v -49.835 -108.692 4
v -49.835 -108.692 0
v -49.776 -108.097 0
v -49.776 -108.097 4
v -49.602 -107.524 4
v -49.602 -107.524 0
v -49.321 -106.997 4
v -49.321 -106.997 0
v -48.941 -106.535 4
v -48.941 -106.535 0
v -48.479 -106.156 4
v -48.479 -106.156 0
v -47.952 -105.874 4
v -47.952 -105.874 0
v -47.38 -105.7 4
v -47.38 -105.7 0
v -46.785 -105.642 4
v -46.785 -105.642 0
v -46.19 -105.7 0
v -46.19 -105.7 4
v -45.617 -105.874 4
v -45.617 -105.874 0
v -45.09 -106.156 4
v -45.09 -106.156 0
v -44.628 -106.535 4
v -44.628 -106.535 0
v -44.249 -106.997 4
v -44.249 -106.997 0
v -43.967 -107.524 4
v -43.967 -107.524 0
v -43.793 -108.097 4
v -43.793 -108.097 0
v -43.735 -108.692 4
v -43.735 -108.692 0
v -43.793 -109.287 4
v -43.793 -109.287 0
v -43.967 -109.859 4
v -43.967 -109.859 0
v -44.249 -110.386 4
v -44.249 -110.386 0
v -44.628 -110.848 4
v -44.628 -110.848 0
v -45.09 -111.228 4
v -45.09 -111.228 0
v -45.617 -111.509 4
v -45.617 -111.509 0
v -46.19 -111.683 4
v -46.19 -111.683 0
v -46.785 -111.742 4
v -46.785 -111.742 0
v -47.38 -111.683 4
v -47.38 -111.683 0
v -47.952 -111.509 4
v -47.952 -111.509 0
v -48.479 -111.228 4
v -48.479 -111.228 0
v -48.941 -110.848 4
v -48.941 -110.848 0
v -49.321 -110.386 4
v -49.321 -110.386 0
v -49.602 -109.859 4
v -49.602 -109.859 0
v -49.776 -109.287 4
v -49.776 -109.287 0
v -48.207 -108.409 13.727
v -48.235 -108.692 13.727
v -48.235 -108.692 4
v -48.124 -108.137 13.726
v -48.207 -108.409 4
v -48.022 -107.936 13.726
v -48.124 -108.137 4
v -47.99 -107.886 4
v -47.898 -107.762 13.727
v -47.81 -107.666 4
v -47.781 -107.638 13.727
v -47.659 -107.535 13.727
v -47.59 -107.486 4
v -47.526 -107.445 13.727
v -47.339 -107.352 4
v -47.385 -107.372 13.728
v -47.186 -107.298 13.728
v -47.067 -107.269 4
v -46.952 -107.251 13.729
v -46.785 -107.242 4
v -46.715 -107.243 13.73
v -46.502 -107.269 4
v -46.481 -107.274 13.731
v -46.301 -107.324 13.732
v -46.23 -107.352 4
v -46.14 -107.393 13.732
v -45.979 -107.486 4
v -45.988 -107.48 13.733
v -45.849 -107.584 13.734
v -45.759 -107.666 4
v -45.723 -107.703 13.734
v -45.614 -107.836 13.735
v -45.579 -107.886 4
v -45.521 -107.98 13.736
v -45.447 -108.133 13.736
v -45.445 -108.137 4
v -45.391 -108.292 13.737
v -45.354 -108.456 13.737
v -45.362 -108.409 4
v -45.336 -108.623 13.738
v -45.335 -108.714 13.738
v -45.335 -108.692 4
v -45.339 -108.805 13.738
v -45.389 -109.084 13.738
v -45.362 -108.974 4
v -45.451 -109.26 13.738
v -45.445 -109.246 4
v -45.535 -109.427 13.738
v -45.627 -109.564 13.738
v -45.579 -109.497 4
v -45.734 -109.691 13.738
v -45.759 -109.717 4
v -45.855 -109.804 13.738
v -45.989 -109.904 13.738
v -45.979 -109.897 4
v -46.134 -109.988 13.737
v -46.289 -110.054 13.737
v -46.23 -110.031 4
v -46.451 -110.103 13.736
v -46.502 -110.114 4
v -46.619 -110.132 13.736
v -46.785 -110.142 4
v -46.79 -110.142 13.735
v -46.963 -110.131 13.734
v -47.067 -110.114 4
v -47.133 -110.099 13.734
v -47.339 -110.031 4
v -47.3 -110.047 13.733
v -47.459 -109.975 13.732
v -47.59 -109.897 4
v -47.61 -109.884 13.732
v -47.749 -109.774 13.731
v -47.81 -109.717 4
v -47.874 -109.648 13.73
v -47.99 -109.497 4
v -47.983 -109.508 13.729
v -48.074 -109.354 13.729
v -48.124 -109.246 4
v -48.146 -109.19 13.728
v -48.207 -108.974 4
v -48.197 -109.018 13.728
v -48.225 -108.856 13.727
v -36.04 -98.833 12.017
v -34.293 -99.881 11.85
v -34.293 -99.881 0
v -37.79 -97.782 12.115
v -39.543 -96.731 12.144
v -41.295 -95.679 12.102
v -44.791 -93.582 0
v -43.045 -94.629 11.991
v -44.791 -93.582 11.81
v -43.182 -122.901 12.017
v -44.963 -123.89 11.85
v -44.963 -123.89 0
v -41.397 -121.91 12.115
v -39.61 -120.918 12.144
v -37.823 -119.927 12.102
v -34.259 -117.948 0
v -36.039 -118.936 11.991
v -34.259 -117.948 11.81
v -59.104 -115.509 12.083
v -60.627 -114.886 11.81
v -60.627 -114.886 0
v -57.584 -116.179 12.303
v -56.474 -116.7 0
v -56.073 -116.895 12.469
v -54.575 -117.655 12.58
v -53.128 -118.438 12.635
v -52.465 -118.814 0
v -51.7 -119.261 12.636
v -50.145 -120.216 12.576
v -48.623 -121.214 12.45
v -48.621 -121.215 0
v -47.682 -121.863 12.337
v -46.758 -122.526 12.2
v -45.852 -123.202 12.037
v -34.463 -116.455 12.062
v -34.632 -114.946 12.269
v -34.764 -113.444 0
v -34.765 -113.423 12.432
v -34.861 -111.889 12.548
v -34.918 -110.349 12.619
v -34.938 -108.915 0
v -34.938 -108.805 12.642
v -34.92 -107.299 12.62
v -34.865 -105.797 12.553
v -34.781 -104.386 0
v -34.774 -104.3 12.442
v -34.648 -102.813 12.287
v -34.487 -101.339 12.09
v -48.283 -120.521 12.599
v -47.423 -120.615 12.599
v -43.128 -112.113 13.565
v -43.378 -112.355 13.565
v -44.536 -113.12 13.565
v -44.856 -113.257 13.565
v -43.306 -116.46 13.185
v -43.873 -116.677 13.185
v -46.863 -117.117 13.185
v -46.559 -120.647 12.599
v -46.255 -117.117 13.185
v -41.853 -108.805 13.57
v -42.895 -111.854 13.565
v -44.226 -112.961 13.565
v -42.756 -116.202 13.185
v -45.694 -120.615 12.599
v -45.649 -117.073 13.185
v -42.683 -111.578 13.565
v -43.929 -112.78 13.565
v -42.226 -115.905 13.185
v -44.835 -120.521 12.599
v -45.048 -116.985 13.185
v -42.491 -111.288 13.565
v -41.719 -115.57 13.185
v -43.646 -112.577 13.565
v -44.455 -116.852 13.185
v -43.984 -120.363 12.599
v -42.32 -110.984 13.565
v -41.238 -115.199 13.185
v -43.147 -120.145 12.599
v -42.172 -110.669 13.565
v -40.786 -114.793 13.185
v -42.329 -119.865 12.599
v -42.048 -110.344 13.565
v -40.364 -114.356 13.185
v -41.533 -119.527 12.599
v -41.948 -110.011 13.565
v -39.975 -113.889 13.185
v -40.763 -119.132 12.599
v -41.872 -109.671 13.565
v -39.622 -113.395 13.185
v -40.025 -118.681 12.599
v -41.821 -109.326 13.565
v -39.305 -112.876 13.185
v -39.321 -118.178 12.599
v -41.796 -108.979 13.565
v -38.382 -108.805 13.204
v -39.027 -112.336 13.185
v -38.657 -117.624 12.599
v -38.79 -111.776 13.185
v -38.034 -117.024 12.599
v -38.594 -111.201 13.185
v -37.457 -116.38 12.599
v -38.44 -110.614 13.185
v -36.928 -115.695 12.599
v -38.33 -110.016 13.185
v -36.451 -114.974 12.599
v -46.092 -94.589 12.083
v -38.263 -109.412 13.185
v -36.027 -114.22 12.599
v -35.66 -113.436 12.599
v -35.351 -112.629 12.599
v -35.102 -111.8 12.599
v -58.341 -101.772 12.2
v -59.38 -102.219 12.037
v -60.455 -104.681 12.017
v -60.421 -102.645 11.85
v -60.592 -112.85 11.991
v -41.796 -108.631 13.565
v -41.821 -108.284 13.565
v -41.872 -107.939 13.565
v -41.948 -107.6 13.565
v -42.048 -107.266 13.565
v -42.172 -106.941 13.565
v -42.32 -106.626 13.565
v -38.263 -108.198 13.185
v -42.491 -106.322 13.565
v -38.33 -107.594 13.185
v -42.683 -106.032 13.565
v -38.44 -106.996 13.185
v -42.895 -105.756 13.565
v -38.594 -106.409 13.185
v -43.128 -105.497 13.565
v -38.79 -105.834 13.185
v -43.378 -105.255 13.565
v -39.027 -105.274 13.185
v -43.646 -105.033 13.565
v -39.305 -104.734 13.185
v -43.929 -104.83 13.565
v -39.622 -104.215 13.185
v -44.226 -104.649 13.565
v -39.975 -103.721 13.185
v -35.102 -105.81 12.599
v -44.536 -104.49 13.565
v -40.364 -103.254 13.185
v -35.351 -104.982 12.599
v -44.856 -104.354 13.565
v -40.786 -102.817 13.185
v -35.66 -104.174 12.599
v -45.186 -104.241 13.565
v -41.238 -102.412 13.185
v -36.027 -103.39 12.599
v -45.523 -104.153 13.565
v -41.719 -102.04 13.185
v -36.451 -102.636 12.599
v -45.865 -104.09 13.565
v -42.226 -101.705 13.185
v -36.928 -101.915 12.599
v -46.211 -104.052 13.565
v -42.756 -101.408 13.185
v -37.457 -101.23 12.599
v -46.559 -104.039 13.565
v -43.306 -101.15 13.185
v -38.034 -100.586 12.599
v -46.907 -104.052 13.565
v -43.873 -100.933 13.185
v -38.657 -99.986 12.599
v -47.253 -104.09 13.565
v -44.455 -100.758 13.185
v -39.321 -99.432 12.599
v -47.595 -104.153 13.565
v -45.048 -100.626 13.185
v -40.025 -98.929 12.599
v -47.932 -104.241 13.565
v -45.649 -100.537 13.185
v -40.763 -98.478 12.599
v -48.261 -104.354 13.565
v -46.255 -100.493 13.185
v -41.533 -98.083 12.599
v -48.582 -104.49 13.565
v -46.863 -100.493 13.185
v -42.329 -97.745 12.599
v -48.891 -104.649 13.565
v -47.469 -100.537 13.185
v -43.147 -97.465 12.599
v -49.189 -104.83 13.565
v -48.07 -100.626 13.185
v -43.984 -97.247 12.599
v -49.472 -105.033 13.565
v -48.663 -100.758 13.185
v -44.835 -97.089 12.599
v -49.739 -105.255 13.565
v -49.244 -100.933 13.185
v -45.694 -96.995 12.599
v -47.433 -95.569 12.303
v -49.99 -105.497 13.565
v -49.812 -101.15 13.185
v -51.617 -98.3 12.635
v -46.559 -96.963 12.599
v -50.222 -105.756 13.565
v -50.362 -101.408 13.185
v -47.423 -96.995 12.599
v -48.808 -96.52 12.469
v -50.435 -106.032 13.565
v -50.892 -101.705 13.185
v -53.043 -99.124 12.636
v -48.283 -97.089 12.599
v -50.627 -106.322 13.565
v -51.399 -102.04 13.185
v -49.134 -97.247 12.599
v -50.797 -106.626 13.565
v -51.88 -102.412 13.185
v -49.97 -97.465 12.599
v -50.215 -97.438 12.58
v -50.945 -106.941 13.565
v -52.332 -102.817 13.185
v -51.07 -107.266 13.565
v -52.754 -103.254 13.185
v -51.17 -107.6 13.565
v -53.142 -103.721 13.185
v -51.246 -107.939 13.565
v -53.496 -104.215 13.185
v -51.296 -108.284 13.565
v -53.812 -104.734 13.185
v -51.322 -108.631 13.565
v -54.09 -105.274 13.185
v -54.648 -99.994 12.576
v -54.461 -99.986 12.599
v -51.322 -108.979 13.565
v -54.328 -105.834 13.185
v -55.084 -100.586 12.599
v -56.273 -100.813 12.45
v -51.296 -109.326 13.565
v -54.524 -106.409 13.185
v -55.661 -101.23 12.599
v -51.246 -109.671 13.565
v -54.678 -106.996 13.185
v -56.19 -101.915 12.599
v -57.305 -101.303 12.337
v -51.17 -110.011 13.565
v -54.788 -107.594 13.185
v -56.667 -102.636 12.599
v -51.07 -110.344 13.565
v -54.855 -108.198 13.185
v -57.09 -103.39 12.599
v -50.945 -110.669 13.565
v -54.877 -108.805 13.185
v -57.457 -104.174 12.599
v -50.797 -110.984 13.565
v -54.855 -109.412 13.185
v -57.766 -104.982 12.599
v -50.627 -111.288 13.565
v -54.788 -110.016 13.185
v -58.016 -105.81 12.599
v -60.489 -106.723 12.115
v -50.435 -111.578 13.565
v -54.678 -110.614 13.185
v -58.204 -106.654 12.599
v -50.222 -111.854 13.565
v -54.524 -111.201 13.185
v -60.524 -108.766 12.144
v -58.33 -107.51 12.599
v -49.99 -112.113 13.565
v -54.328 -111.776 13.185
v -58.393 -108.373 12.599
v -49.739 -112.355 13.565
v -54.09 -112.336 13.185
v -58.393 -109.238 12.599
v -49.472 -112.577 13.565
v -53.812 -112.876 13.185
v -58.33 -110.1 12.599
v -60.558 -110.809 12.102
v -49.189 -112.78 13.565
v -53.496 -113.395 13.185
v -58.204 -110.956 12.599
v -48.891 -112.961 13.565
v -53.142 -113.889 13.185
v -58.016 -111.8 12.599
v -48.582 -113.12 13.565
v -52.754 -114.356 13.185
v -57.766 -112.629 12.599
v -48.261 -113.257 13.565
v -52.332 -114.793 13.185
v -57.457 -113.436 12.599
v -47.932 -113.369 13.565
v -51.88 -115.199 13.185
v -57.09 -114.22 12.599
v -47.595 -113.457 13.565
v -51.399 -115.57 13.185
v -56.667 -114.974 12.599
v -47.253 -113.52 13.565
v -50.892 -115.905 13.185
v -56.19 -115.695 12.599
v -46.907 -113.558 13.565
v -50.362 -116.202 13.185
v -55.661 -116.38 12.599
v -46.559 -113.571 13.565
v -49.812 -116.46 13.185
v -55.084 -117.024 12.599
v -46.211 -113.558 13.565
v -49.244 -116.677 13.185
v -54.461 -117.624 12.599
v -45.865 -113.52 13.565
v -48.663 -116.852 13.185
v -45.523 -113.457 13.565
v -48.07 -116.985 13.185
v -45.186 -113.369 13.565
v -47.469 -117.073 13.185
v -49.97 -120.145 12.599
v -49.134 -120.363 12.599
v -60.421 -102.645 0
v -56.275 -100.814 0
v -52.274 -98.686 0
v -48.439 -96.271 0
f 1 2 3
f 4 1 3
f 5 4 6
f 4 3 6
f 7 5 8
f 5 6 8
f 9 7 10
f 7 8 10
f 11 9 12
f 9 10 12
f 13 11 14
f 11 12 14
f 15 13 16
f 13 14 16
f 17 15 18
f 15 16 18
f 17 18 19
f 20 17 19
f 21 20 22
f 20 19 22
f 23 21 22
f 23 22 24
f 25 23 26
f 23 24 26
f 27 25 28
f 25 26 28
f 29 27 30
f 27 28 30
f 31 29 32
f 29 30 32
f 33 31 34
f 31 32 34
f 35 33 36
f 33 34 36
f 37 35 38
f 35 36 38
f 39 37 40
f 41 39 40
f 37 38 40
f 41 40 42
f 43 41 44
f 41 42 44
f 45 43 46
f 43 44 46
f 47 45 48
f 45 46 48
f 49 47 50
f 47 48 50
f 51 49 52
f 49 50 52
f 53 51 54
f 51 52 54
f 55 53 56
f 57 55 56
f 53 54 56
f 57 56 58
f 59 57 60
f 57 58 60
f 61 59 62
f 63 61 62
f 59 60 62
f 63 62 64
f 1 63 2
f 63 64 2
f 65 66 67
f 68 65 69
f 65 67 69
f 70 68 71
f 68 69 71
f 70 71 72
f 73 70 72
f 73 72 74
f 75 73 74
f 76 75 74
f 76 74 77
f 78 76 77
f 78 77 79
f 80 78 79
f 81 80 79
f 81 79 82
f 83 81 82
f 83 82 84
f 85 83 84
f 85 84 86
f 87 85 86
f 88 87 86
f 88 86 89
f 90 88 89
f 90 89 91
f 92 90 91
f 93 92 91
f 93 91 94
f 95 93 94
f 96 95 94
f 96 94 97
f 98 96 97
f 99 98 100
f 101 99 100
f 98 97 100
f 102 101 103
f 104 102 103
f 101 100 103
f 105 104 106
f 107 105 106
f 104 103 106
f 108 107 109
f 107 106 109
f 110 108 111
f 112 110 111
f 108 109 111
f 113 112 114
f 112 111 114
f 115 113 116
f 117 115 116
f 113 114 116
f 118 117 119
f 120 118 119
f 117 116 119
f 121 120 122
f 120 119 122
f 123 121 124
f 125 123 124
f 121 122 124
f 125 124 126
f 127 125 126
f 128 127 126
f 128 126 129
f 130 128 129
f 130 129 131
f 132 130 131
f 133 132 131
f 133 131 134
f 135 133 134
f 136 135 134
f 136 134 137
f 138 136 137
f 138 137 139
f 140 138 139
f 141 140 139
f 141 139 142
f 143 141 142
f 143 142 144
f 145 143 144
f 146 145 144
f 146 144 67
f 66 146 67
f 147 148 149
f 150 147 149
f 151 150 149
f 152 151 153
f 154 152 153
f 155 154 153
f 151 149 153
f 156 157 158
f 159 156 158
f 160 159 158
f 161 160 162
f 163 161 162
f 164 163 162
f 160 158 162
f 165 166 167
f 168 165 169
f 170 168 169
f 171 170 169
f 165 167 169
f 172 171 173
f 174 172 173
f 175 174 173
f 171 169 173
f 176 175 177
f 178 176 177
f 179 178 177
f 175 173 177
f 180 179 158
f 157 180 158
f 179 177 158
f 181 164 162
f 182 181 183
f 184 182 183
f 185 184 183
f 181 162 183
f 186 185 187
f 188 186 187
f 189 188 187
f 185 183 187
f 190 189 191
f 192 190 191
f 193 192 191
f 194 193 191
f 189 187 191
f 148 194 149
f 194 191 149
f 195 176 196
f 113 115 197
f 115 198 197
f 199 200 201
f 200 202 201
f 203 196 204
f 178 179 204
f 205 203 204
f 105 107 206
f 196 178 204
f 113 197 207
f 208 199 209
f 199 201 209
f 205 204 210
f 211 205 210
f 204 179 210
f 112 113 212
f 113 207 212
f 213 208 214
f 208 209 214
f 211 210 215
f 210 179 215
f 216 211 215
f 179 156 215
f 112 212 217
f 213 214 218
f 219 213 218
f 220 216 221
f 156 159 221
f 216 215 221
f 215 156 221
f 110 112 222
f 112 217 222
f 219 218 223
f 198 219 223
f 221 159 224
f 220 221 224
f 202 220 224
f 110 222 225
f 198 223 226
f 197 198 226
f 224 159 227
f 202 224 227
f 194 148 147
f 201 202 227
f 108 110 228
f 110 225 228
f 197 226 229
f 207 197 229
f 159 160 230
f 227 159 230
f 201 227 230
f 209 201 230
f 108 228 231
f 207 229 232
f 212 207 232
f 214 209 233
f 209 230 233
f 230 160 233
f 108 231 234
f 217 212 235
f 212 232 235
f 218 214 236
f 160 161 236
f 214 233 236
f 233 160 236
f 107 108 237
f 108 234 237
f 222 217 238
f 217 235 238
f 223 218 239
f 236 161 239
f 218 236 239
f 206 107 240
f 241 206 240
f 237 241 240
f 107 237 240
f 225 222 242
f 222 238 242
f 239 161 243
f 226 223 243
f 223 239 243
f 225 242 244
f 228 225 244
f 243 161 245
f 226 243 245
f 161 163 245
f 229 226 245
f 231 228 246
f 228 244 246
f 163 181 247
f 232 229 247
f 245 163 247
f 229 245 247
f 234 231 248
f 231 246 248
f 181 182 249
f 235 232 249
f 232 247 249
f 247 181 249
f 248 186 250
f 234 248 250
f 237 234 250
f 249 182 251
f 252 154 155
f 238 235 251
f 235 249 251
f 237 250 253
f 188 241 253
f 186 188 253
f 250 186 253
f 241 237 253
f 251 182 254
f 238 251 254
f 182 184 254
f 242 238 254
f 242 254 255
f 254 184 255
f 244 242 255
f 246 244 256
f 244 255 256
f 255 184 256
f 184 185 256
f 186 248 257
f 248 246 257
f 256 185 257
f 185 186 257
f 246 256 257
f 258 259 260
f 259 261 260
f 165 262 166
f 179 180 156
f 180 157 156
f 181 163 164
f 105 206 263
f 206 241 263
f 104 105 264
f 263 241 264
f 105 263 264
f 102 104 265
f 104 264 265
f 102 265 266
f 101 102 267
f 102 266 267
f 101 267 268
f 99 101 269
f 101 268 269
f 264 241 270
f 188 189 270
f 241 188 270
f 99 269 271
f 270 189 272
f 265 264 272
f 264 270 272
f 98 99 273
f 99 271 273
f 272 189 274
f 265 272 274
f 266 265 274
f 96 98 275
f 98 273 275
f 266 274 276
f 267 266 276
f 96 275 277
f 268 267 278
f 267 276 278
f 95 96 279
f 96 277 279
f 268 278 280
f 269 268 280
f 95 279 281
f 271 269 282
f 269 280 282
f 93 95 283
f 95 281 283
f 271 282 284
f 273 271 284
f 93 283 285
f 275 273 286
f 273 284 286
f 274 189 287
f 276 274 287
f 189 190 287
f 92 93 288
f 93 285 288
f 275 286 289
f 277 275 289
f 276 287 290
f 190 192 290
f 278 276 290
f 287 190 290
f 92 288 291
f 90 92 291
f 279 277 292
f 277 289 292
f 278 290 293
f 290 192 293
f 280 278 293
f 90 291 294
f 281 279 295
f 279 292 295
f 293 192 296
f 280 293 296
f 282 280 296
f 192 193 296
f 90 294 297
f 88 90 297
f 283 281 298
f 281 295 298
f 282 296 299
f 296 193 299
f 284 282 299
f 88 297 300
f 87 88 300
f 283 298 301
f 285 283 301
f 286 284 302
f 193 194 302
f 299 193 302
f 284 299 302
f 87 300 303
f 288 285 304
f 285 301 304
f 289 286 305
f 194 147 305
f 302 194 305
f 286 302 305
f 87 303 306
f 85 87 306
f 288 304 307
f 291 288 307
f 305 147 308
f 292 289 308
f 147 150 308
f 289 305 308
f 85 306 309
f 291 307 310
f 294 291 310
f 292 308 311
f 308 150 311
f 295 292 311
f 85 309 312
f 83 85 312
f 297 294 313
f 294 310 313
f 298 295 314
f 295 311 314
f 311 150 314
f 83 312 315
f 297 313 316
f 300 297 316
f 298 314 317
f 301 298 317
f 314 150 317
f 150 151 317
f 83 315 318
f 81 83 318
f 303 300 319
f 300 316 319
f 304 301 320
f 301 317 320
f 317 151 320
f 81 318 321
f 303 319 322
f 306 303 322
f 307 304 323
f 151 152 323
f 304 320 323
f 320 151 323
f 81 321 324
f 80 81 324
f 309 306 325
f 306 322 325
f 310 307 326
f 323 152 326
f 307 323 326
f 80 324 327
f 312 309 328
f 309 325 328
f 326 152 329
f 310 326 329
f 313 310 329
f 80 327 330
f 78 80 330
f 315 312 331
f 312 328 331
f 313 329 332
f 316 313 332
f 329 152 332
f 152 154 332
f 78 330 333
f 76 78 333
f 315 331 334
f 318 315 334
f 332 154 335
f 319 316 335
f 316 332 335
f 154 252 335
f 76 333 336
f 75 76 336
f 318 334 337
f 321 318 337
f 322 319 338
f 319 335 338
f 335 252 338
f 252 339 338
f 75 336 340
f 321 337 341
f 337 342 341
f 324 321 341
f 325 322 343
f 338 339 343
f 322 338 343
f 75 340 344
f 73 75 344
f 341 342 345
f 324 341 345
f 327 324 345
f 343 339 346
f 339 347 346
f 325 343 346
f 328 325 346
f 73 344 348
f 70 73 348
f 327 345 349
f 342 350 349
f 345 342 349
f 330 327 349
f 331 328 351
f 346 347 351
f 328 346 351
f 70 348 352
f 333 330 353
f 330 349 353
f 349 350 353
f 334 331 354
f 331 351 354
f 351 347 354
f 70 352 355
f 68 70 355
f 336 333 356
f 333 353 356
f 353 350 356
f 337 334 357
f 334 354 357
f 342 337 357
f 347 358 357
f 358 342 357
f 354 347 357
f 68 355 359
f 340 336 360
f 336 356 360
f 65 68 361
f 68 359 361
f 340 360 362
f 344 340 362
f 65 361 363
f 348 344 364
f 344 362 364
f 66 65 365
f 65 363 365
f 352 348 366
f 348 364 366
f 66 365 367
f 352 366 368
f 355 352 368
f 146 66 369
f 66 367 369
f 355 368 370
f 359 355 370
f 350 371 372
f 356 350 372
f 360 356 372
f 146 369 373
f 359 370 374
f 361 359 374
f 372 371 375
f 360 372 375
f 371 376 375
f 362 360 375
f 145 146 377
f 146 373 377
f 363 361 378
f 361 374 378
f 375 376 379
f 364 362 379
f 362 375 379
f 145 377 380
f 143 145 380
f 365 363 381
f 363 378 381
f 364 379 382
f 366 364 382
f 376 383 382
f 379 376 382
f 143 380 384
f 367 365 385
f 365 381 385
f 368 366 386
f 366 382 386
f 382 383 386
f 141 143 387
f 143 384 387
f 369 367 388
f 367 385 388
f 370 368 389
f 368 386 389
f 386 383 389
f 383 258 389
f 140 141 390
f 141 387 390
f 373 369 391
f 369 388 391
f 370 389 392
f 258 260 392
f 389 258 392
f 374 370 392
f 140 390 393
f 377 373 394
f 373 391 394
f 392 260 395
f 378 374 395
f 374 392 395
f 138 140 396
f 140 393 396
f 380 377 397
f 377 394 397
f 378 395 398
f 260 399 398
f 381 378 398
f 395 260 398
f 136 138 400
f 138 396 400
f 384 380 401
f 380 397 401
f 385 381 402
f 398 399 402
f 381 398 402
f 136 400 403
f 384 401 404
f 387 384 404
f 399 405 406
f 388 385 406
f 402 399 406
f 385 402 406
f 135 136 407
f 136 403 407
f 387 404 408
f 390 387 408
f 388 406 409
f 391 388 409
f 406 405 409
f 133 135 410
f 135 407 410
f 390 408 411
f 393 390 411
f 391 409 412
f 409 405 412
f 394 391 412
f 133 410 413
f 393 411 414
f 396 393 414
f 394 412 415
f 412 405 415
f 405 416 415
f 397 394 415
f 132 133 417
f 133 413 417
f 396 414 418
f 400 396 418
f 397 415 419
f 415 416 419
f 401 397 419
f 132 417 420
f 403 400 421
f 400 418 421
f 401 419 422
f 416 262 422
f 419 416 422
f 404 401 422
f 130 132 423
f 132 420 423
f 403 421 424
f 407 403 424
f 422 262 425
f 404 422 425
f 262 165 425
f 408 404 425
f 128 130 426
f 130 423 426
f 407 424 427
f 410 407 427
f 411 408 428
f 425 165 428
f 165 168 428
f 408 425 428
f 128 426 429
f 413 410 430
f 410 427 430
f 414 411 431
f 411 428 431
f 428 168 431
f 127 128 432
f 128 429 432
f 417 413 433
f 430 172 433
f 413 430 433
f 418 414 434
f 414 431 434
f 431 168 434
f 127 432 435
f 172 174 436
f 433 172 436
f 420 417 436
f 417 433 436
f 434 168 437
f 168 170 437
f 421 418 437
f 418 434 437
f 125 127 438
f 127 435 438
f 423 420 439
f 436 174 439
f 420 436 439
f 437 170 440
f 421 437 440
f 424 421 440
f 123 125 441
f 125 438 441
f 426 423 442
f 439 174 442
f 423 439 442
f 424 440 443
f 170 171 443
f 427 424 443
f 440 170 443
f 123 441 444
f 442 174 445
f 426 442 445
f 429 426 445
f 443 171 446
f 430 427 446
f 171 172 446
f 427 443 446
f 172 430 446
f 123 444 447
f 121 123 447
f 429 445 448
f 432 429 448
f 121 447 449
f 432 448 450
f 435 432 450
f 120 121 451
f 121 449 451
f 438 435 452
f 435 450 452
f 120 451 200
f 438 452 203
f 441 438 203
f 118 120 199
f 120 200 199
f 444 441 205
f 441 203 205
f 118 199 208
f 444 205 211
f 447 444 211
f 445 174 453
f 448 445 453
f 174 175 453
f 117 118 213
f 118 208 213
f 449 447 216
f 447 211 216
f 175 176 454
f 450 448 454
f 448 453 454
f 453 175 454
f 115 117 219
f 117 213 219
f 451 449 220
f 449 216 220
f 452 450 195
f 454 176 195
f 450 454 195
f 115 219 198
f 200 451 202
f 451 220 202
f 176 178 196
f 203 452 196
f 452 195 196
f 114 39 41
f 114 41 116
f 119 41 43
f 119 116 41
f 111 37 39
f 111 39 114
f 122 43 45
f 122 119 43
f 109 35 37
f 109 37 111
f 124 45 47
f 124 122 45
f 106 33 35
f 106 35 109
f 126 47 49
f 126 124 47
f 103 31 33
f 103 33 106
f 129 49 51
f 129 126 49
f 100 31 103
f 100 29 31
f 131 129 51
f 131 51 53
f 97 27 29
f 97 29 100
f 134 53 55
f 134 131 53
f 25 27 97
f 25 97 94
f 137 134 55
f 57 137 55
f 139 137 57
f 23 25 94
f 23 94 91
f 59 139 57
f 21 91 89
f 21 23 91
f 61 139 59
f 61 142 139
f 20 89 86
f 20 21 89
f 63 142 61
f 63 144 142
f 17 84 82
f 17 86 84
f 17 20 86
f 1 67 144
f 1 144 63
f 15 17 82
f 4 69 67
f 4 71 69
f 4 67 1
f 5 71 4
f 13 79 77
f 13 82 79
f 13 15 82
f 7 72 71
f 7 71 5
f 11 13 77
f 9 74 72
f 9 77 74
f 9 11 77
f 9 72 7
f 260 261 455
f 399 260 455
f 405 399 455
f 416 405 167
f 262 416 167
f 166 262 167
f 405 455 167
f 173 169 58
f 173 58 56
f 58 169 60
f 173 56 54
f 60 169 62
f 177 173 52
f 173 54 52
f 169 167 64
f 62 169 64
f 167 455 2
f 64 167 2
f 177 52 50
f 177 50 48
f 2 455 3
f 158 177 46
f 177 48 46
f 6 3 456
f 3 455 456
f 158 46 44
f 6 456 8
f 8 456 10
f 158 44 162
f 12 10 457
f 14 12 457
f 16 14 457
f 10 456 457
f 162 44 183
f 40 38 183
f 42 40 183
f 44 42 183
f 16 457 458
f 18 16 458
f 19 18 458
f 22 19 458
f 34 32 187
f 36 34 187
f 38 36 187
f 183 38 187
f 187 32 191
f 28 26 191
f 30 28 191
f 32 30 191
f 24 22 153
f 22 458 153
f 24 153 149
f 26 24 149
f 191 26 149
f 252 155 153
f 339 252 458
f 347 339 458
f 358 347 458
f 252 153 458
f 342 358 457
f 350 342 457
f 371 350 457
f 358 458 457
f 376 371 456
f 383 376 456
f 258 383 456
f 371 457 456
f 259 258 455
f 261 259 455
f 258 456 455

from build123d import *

# Parameters (mm, degrees)
BOSS_EXTRUDE1_DEPTH = 13.75
SKETCH4_R           = 3.05
CUT_EXTRUDE1_DEPTH  = 4
SKETCH5_R           = 1.45
CUT_EXTRUDE2_DEPTH  = 139.272786048


with BuildPart() as part:
    # Boss-Extrude1: read off the stored shape, not the designer's step
    # Boss-Extrude1 outline → Boss-Extrude1 (new body)
    with BuildSketch(Plane.XY):
        with BuildLine():
            Line((-44.963090762, -123.889928328), (-34.25904674, -117.947860363))
            ThreePointArc((-34.25904674, -117.947860363), (-34.937745159, -108.915491102), (-34.292771341, -99.880651048))
            Line((-34.292771341, -99.880651048), (-44.790775161, -93.581710984))
            ThreePointArc((-44.790775161, -93.581710984), (-52.273687189, -98.685665687), (-60.420575103, -102.644522003))
            Line((-60.420575103, -102.644522003), (-60.626615305, -114.885530032))
            ThreePointArc((-60.626615305, -114.885530032), (-52.465004859, -118.81394459), (-44.963090762, -123.889928328))
        make_face()
    extrude(amount=BOSS_EXTRUDE1_DEPTH)

    # Boss-Extrude1 2 outline → Boss-Extrude1 2 (revolve, cut)
    with BuildSketch(Plane(origin=(-46.558812402, -108.805033793, 0), x_dir=(1, 0, 0), z_dir=(0, -1, 0))):
        with BuildLine():
            ThreePointArc((0, 13.75), (7.723984527, 13.263031911), (15.32564925, 11.809839448))
            Line((15.32564925, 11.809839448), (15.32564925, 13.75))
            Line((15.32564925, 13.75), (0, 13.75))
        make_face()
    revolve(axis=Axis((-46.558812402, -108.805033793, 0), (0, 0, 1)), mode=Mode.SUBTRACT)

    # Sketch4 → Cut-Extrude1 (cut)
    with BuildSketch(Plane(origin=(0, 0, 0), x_dir=(-1, 0, 0), z_dir=(0, 0, -1))):
        with Locations((46.784528167, -108.691568131)):
            Circle(SKETCH4_R)
    extrude(amount=-CUT_EXTRUDE1_DEPTH, mode=Mode.SUBTRACT)

    # Sketch5 → Cut-Extrude2 (cut, through all)
    with BuildSketch(Plane(origin=(0, 0, 4), x_dir=(-1, 0, 0), z_dir=(0, 0, -1))):
        with Locations((46.784528167, -108.691568131)):
            Circle(SKETCH5_R)
    extrude(amount=-CUT_EXTRUDE2_DEPTH, mode=Mode.SUBTRACT)


solid = part.part
